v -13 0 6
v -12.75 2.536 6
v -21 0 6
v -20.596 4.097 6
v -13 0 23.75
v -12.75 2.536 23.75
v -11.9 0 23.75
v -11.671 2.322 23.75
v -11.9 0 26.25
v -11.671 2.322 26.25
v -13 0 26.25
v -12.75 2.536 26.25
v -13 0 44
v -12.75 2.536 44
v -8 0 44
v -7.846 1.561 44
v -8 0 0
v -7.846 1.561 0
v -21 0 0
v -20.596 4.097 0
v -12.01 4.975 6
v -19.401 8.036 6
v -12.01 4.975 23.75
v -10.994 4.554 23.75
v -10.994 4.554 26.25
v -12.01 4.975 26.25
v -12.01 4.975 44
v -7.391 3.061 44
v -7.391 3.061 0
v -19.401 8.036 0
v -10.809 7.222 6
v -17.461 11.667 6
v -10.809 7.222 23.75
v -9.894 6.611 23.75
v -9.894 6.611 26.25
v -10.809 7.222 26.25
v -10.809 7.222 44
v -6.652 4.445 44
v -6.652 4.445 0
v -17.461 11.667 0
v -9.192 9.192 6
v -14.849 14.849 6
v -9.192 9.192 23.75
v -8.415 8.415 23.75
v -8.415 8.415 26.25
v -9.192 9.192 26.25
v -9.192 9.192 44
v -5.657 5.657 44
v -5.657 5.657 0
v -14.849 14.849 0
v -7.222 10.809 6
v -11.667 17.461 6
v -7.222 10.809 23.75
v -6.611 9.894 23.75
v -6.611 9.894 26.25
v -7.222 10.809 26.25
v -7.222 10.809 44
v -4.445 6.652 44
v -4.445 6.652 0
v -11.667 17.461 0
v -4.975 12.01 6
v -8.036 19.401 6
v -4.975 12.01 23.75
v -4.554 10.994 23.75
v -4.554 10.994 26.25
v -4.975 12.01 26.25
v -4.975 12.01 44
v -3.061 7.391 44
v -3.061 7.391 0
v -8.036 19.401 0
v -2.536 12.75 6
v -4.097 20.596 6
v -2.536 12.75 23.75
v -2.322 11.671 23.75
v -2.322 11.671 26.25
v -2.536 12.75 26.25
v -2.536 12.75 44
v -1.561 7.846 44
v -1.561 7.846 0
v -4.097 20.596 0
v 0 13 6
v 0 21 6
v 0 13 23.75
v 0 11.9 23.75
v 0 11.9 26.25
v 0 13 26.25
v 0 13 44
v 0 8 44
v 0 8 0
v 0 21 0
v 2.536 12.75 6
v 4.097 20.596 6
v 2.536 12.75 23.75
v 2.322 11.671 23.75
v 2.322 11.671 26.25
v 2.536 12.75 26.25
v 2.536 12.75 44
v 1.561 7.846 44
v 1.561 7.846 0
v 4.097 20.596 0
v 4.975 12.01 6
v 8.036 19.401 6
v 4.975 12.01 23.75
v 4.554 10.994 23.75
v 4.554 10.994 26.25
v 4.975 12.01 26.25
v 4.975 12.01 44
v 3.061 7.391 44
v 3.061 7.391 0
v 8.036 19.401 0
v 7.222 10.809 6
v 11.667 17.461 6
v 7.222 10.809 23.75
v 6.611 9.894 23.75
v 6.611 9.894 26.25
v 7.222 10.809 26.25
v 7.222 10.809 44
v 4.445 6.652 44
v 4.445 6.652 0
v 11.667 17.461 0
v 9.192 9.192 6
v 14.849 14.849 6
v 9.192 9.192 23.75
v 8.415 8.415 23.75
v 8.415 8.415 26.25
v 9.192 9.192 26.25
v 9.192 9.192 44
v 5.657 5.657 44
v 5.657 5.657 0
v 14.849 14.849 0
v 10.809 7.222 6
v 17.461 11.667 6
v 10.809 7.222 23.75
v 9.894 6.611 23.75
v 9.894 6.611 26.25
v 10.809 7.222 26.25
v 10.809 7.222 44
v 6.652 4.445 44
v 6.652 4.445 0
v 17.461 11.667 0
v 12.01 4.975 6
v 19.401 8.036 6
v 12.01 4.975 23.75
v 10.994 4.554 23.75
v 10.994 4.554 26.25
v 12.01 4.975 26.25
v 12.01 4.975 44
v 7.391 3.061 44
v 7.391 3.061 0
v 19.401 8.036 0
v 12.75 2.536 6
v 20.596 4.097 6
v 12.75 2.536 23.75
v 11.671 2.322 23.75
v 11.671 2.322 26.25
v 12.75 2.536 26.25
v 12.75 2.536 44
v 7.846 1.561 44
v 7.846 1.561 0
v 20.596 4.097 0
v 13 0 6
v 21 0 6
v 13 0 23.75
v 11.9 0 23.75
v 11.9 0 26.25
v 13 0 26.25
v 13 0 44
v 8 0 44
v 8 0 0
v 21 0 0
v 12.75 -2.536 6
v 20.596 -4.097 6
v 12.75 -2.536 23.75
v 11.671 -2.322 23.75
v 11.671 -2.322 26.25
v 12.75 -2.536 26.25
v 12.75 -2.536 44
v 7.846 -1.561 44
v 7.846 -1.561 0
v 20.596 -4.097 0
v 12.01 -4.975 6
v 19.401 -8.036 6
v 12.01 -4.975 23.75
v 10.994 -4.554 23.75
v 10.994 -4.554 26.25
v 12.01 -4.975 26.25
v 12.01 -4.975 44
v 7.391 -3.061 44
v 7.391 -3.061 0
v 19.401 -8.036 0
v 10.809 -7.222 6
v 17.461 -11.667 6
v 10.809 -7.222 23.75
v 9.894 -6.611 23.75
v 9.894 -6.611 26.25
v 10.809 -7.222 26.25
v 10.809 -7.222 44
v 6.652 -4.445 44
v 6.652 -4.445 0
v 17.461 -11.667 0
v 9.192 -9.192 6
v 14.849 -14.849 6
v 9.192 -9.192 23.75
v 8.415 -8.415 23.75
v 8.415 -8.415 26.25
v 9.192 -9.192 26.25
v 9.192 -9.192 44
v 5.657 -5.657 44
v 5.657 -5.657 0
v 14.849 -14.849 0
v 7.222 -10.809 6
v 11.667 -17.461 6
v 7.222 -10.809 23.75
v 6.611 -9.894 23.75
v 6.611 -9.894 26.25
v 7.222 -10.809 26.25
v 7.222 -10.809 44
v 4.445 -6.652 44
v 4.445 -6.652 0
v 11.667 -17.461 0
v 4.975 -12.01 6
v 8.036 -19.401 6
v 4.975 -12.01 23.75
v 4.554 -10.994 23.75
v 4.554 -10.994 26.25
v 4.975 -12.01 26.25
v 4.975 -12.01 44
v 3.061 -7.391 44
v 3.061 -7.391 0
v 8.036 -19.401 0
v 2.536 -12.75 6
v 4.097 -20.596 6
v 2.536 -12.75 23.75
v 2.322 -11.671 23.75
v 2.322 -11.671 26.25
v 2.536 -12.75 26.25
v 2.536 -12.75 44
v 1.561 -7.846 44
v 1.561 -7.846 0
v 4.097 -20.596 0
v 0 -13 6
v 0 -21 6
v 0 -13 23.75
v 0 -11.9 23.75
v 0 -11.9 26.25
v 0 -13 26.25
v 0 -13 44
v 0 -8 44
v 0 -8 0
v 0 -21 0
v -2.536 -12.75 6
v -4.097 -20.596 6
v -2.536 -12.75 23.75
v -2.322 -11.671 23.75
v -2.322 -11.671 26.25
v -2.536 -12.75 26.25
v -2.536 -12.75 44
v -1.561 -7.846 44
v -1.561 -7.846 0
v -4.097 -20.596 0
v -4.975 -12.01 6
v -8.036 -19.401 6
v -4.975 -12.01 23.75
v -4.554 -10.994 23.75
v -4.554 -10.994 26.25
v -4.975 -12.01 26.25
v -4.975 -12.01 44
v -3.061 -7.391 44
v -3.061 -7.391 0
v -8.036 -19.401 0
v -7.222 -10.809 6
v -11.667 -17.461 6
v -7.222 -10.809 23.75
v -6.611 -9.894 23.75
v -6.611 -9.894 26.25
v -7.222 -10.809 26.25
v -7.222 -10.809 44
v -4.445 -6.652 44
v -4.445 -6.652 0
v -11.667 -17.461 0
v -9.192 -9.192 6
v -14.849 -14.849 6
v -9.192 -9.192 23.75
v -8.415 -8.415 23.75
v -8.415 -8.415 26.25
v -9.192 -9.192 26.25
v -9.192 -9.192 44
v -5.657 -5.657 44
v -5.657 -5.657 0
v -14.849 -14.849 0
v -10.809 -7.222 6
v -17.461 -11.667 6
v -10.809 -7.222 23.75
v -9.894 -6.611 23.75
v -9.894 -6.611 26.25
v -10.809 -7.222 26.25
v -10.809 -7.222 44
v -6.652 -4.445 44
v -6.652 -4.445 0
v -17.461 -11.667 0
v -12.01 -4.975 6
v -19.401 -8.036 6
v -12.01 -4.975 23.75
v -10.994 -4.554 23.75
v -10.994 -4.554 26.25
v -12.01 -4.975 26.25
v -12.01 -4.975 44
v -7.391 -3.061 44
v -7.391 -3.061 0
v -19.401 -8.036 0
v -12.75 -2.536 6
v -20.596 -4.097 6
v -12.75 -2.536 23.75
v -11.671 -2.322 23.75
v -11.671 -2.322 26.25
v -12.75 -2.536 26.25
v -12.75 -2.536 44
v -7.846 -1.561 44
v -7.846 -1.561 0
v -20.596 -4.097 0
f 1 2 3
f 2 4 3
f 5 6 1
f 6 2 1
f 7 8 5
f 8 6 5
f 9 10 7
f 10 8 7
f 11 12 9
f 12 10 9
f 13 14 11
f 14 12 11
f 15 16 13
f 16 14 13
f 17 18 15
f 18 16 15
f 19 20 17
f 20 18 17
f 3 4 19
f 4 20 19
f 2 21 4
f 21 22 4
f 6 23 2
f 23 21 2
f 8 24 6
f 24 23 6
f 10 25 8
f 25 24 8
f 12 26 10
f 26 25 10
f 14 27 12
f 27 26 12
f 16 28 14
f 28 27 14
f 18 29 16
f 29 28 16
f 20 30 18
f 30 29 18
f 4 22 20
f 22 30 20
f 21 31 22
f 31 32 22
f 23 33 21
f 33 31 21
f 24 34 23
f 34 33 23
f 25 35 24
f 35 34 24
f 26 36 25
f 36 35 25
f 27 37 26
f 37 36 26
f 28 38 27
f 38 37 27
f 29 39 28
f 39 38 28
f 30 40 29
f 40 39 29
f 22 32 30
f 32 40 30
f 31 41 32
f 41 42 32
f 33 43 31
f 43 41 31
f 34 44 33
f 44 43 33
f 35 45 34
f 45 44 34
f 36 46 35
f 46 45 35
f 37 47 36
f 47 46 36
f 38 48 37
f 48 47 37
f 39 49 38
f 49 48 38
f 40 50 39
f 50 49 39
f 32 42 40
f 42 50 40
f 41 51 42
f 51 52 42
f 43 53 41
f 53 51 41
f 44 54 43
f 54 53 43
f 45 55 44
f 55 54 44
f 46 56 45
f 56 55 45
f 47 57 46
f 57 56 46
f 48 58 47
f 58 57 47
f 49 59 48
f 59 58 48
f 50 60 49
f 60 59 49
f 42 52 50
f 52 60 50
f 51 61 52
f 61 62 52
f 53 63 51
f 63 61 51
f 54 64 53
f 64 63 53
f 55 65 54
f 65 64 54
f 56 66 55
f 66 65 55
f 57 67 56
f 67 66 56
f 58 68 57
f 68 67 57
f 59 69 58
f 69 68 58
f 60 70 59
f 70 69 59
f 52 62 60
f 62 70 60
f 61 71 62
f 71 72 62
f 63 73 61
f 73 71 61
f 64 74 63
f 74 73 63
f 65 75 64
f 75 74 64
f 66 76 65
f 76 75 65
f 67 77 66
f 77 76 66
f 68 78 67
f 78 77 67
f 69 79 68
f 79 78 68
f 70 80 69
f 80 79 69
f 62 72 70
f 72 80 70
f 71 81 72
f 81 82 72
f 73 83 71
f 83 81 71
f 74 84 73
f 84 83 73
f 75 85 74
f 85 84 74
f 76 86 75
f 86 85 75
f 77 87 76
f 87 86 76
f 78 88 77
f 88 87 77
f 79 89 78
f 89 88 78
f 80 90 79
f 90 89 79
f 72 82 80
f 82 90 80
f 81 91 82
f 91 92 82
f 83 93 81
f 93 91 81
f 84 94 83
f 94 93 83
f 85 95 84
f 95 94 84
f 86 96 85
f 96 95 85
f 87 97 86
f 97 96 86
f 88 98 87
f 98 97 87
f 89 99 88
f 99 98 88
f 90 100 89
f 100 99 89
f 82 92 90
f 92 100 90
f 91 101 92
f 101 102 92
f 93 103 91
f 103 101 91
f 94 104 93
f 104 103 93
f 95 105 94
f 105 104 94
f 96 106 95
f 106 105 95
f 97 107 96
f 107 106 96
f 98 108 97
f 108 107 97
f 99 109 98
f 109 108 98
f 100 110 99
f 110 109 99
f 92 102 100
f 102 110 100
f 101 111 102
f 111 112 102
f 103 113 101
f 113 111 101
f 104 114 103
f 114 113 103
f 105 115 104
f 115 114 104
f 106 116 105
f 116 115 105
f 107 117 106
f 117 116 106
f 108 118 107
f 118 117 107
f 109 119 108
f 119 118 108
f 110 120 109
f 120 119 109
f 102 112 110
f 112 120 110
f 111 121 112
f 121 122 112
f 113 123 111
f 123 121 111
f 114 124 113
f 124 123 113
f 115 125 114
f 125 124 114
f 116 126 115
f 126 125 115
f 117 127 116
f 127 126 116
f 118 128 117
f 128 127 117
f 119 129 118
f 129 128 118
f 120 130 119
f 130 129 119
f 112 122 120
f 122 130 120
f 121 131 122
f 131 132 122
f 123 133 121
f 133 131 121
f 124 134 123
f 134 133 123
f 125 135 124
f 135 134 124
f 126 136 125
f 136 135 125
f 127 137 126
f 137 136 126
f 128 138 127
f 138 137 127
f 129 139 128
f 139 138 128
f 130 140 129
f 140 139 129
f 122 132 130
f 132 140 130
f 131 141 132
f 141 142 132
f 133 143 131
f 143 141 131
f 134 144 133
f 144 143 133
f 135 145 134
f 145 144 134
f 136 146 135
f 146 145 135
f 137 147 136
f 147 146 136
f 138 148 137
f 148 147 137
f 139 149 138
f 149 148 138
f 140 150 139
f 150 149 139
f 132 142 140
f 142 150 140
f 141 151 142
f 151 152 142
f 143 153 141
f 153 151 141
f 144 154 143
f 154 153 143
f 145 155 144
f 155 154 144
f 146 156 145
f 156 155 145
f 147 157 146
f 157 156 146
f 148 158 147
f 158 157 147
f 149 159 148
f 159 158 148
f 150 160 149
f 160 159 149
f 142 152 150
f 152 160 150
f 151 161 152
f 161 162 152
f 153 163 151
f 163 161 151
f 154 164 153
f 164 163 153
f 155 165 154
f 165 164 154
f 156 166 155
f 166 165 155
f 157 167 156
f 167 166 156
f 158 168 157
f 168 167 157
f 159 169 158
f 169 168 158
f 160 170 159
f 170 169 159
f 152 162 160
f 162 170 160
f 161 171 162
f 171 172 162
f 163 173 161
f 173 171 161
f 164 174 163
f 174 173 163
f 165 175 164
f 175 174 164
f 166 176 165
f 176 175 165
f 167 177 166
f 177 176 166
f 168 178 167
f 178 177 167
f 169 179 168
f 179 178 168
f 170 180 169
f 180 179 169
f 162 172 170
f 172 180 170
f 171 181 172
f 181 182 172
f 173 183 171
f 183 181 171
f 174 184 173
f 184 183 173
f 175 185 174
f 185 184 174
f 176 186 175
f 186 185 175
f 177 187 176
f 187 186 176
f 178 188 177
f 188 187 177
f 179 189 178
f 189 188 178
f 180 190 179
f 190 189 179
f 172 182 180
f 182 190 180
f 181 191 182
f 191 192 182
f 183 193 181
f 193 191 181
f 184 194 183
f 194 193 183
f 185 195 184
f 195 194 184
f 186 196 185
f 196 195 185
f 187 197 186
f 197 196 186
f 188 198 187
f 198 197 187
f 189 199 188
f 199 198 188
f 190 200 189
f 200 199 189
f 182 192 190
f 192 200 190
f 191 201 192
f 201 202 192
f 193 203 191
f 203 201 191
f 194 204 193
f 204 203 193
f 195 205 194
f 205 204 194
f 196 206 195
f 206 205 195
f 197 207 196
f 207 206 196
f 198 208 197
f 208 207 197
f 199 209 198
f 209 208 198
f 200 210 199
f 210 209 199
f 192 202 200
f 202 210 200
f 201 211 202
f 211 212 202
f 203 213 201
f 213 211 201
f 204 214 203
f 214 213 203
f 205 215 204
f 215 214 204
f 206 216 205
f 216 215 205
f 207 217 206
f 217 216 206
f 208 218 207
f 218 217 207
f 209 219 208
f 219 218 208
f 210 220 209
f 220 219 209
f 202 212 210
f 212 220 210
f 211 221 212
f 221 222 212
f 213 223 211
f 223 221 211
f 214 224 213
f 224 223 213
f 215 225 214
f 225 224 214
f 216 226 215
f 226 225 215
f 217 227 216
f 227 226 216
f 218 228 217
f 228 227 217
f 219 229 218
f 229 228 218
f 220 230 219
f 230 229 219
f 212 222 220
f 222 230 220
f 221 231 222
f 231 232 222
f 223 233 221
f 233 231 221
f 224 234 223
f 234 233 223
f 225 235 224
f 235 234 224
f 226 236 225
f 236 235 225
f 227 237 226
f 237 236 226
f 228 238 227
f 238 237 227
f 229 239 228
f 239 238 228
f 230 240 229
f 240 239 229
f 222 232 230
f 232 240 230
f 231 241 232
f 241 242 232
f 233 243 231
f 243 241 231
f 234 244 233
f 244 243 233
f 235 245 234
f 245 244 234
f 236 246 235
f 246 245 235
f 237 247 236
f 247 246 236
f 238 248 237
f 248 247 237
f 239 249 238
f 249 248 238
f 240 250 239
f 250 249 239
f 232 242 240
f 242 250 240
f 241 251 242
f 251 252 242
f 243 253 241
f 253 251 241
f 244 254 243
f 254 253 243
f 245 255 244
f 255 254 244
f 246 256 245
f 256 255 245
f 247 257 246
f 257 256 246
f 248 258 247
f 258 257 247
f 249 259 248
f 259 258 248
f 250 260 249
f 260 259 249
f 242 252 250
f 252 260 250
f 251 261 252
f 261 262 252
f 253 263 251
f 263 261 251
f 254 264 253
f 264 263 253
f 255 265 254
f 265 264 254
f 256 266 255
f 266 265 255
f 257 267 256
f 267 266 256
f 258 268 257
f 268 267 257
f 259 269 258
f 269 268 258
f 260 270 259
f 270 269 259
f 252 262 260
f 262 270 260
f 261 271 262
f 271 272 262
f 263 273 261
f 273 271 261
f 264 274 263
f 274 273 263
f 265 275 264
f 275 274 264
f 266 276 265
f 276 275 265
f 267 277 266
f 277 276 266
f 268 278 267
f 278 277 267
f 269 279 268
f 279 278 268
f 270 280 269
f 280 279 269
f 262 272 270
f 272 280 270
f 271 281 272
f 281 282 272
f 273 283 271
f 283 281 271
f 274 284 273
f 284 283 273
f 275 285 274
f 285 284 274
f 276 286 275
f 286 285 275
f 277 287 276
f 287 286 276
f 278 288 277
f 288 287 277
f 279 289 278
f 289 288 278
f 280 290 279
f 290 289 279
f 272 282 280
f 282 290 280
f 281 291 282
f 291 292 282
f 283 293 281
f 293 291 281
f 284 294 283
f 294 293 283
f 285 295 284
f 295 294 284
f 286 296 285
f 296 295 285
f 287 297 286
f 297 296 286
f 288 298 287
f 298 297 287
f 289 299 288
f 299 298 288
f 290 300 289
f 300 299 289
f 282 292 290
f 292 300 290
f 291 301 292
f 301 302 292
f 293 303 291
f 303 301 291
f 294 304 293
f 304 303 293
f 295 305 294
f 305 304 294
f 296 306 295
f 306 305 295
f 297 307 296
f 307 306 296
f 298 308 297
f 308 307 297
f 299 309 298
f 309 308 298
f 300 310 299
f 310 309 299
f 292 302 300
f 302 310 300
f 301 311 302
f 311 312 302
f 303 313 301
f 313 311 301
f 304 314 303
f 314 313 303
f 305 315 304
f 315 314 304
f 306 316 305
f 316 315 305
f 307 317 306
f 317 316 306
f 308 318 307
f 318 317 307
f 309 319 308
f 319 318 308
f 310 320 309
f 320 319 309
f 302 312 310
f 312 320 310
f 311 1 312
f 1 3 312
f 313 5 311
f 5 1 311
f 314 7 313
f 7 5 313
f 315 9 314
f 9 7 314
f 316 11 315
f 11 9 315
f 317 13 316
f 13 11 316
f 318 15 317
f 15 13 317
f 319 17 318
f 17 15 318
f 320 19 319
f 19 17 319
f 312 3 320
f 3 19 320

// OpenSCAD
$fn = 32;

// ----------------------------------------------------------------------
// Grooved revolve: flanged, bore R8
// ----------------------------------------------------------------------

// --- parameters (mm) ---
bore_r = 8;               // bore radius
outer_r = 13;             // outer radius of the body
total_h = 44;             // overall height, Z
wall = 5;                 // radial wall thickness
groove_w = 2.5;           // groove width
groove_d = 1.1;           // groove depth
grooves = 1;              // number of outer grooves
flange_r = 21;            // flange radius
flange_h = 6;             // flange height

bbox_x = 2 * flange_r;  // full diameter
bore_d = 2 * bore_r;  // bore diameter
body_d = 2 * outer_r;  // body diameter
flange_d = 2 * flange_r;  // flange diameter
revolve_angle = 360;  // full turn around the Z axis

profile = [[8, 0], [13, 0], [21, 0], [21, 6], [13, 6], [13, 23.75], [11.9, 23.75], [11.9, 26.25], [13, 26.25], [13, 44], [8, 44]];  // primary outline, 11 points, counter clockwise

// --- the one profile operation ---
rotate_extrude(angle = revolve_angle) polygon(points = profile);
